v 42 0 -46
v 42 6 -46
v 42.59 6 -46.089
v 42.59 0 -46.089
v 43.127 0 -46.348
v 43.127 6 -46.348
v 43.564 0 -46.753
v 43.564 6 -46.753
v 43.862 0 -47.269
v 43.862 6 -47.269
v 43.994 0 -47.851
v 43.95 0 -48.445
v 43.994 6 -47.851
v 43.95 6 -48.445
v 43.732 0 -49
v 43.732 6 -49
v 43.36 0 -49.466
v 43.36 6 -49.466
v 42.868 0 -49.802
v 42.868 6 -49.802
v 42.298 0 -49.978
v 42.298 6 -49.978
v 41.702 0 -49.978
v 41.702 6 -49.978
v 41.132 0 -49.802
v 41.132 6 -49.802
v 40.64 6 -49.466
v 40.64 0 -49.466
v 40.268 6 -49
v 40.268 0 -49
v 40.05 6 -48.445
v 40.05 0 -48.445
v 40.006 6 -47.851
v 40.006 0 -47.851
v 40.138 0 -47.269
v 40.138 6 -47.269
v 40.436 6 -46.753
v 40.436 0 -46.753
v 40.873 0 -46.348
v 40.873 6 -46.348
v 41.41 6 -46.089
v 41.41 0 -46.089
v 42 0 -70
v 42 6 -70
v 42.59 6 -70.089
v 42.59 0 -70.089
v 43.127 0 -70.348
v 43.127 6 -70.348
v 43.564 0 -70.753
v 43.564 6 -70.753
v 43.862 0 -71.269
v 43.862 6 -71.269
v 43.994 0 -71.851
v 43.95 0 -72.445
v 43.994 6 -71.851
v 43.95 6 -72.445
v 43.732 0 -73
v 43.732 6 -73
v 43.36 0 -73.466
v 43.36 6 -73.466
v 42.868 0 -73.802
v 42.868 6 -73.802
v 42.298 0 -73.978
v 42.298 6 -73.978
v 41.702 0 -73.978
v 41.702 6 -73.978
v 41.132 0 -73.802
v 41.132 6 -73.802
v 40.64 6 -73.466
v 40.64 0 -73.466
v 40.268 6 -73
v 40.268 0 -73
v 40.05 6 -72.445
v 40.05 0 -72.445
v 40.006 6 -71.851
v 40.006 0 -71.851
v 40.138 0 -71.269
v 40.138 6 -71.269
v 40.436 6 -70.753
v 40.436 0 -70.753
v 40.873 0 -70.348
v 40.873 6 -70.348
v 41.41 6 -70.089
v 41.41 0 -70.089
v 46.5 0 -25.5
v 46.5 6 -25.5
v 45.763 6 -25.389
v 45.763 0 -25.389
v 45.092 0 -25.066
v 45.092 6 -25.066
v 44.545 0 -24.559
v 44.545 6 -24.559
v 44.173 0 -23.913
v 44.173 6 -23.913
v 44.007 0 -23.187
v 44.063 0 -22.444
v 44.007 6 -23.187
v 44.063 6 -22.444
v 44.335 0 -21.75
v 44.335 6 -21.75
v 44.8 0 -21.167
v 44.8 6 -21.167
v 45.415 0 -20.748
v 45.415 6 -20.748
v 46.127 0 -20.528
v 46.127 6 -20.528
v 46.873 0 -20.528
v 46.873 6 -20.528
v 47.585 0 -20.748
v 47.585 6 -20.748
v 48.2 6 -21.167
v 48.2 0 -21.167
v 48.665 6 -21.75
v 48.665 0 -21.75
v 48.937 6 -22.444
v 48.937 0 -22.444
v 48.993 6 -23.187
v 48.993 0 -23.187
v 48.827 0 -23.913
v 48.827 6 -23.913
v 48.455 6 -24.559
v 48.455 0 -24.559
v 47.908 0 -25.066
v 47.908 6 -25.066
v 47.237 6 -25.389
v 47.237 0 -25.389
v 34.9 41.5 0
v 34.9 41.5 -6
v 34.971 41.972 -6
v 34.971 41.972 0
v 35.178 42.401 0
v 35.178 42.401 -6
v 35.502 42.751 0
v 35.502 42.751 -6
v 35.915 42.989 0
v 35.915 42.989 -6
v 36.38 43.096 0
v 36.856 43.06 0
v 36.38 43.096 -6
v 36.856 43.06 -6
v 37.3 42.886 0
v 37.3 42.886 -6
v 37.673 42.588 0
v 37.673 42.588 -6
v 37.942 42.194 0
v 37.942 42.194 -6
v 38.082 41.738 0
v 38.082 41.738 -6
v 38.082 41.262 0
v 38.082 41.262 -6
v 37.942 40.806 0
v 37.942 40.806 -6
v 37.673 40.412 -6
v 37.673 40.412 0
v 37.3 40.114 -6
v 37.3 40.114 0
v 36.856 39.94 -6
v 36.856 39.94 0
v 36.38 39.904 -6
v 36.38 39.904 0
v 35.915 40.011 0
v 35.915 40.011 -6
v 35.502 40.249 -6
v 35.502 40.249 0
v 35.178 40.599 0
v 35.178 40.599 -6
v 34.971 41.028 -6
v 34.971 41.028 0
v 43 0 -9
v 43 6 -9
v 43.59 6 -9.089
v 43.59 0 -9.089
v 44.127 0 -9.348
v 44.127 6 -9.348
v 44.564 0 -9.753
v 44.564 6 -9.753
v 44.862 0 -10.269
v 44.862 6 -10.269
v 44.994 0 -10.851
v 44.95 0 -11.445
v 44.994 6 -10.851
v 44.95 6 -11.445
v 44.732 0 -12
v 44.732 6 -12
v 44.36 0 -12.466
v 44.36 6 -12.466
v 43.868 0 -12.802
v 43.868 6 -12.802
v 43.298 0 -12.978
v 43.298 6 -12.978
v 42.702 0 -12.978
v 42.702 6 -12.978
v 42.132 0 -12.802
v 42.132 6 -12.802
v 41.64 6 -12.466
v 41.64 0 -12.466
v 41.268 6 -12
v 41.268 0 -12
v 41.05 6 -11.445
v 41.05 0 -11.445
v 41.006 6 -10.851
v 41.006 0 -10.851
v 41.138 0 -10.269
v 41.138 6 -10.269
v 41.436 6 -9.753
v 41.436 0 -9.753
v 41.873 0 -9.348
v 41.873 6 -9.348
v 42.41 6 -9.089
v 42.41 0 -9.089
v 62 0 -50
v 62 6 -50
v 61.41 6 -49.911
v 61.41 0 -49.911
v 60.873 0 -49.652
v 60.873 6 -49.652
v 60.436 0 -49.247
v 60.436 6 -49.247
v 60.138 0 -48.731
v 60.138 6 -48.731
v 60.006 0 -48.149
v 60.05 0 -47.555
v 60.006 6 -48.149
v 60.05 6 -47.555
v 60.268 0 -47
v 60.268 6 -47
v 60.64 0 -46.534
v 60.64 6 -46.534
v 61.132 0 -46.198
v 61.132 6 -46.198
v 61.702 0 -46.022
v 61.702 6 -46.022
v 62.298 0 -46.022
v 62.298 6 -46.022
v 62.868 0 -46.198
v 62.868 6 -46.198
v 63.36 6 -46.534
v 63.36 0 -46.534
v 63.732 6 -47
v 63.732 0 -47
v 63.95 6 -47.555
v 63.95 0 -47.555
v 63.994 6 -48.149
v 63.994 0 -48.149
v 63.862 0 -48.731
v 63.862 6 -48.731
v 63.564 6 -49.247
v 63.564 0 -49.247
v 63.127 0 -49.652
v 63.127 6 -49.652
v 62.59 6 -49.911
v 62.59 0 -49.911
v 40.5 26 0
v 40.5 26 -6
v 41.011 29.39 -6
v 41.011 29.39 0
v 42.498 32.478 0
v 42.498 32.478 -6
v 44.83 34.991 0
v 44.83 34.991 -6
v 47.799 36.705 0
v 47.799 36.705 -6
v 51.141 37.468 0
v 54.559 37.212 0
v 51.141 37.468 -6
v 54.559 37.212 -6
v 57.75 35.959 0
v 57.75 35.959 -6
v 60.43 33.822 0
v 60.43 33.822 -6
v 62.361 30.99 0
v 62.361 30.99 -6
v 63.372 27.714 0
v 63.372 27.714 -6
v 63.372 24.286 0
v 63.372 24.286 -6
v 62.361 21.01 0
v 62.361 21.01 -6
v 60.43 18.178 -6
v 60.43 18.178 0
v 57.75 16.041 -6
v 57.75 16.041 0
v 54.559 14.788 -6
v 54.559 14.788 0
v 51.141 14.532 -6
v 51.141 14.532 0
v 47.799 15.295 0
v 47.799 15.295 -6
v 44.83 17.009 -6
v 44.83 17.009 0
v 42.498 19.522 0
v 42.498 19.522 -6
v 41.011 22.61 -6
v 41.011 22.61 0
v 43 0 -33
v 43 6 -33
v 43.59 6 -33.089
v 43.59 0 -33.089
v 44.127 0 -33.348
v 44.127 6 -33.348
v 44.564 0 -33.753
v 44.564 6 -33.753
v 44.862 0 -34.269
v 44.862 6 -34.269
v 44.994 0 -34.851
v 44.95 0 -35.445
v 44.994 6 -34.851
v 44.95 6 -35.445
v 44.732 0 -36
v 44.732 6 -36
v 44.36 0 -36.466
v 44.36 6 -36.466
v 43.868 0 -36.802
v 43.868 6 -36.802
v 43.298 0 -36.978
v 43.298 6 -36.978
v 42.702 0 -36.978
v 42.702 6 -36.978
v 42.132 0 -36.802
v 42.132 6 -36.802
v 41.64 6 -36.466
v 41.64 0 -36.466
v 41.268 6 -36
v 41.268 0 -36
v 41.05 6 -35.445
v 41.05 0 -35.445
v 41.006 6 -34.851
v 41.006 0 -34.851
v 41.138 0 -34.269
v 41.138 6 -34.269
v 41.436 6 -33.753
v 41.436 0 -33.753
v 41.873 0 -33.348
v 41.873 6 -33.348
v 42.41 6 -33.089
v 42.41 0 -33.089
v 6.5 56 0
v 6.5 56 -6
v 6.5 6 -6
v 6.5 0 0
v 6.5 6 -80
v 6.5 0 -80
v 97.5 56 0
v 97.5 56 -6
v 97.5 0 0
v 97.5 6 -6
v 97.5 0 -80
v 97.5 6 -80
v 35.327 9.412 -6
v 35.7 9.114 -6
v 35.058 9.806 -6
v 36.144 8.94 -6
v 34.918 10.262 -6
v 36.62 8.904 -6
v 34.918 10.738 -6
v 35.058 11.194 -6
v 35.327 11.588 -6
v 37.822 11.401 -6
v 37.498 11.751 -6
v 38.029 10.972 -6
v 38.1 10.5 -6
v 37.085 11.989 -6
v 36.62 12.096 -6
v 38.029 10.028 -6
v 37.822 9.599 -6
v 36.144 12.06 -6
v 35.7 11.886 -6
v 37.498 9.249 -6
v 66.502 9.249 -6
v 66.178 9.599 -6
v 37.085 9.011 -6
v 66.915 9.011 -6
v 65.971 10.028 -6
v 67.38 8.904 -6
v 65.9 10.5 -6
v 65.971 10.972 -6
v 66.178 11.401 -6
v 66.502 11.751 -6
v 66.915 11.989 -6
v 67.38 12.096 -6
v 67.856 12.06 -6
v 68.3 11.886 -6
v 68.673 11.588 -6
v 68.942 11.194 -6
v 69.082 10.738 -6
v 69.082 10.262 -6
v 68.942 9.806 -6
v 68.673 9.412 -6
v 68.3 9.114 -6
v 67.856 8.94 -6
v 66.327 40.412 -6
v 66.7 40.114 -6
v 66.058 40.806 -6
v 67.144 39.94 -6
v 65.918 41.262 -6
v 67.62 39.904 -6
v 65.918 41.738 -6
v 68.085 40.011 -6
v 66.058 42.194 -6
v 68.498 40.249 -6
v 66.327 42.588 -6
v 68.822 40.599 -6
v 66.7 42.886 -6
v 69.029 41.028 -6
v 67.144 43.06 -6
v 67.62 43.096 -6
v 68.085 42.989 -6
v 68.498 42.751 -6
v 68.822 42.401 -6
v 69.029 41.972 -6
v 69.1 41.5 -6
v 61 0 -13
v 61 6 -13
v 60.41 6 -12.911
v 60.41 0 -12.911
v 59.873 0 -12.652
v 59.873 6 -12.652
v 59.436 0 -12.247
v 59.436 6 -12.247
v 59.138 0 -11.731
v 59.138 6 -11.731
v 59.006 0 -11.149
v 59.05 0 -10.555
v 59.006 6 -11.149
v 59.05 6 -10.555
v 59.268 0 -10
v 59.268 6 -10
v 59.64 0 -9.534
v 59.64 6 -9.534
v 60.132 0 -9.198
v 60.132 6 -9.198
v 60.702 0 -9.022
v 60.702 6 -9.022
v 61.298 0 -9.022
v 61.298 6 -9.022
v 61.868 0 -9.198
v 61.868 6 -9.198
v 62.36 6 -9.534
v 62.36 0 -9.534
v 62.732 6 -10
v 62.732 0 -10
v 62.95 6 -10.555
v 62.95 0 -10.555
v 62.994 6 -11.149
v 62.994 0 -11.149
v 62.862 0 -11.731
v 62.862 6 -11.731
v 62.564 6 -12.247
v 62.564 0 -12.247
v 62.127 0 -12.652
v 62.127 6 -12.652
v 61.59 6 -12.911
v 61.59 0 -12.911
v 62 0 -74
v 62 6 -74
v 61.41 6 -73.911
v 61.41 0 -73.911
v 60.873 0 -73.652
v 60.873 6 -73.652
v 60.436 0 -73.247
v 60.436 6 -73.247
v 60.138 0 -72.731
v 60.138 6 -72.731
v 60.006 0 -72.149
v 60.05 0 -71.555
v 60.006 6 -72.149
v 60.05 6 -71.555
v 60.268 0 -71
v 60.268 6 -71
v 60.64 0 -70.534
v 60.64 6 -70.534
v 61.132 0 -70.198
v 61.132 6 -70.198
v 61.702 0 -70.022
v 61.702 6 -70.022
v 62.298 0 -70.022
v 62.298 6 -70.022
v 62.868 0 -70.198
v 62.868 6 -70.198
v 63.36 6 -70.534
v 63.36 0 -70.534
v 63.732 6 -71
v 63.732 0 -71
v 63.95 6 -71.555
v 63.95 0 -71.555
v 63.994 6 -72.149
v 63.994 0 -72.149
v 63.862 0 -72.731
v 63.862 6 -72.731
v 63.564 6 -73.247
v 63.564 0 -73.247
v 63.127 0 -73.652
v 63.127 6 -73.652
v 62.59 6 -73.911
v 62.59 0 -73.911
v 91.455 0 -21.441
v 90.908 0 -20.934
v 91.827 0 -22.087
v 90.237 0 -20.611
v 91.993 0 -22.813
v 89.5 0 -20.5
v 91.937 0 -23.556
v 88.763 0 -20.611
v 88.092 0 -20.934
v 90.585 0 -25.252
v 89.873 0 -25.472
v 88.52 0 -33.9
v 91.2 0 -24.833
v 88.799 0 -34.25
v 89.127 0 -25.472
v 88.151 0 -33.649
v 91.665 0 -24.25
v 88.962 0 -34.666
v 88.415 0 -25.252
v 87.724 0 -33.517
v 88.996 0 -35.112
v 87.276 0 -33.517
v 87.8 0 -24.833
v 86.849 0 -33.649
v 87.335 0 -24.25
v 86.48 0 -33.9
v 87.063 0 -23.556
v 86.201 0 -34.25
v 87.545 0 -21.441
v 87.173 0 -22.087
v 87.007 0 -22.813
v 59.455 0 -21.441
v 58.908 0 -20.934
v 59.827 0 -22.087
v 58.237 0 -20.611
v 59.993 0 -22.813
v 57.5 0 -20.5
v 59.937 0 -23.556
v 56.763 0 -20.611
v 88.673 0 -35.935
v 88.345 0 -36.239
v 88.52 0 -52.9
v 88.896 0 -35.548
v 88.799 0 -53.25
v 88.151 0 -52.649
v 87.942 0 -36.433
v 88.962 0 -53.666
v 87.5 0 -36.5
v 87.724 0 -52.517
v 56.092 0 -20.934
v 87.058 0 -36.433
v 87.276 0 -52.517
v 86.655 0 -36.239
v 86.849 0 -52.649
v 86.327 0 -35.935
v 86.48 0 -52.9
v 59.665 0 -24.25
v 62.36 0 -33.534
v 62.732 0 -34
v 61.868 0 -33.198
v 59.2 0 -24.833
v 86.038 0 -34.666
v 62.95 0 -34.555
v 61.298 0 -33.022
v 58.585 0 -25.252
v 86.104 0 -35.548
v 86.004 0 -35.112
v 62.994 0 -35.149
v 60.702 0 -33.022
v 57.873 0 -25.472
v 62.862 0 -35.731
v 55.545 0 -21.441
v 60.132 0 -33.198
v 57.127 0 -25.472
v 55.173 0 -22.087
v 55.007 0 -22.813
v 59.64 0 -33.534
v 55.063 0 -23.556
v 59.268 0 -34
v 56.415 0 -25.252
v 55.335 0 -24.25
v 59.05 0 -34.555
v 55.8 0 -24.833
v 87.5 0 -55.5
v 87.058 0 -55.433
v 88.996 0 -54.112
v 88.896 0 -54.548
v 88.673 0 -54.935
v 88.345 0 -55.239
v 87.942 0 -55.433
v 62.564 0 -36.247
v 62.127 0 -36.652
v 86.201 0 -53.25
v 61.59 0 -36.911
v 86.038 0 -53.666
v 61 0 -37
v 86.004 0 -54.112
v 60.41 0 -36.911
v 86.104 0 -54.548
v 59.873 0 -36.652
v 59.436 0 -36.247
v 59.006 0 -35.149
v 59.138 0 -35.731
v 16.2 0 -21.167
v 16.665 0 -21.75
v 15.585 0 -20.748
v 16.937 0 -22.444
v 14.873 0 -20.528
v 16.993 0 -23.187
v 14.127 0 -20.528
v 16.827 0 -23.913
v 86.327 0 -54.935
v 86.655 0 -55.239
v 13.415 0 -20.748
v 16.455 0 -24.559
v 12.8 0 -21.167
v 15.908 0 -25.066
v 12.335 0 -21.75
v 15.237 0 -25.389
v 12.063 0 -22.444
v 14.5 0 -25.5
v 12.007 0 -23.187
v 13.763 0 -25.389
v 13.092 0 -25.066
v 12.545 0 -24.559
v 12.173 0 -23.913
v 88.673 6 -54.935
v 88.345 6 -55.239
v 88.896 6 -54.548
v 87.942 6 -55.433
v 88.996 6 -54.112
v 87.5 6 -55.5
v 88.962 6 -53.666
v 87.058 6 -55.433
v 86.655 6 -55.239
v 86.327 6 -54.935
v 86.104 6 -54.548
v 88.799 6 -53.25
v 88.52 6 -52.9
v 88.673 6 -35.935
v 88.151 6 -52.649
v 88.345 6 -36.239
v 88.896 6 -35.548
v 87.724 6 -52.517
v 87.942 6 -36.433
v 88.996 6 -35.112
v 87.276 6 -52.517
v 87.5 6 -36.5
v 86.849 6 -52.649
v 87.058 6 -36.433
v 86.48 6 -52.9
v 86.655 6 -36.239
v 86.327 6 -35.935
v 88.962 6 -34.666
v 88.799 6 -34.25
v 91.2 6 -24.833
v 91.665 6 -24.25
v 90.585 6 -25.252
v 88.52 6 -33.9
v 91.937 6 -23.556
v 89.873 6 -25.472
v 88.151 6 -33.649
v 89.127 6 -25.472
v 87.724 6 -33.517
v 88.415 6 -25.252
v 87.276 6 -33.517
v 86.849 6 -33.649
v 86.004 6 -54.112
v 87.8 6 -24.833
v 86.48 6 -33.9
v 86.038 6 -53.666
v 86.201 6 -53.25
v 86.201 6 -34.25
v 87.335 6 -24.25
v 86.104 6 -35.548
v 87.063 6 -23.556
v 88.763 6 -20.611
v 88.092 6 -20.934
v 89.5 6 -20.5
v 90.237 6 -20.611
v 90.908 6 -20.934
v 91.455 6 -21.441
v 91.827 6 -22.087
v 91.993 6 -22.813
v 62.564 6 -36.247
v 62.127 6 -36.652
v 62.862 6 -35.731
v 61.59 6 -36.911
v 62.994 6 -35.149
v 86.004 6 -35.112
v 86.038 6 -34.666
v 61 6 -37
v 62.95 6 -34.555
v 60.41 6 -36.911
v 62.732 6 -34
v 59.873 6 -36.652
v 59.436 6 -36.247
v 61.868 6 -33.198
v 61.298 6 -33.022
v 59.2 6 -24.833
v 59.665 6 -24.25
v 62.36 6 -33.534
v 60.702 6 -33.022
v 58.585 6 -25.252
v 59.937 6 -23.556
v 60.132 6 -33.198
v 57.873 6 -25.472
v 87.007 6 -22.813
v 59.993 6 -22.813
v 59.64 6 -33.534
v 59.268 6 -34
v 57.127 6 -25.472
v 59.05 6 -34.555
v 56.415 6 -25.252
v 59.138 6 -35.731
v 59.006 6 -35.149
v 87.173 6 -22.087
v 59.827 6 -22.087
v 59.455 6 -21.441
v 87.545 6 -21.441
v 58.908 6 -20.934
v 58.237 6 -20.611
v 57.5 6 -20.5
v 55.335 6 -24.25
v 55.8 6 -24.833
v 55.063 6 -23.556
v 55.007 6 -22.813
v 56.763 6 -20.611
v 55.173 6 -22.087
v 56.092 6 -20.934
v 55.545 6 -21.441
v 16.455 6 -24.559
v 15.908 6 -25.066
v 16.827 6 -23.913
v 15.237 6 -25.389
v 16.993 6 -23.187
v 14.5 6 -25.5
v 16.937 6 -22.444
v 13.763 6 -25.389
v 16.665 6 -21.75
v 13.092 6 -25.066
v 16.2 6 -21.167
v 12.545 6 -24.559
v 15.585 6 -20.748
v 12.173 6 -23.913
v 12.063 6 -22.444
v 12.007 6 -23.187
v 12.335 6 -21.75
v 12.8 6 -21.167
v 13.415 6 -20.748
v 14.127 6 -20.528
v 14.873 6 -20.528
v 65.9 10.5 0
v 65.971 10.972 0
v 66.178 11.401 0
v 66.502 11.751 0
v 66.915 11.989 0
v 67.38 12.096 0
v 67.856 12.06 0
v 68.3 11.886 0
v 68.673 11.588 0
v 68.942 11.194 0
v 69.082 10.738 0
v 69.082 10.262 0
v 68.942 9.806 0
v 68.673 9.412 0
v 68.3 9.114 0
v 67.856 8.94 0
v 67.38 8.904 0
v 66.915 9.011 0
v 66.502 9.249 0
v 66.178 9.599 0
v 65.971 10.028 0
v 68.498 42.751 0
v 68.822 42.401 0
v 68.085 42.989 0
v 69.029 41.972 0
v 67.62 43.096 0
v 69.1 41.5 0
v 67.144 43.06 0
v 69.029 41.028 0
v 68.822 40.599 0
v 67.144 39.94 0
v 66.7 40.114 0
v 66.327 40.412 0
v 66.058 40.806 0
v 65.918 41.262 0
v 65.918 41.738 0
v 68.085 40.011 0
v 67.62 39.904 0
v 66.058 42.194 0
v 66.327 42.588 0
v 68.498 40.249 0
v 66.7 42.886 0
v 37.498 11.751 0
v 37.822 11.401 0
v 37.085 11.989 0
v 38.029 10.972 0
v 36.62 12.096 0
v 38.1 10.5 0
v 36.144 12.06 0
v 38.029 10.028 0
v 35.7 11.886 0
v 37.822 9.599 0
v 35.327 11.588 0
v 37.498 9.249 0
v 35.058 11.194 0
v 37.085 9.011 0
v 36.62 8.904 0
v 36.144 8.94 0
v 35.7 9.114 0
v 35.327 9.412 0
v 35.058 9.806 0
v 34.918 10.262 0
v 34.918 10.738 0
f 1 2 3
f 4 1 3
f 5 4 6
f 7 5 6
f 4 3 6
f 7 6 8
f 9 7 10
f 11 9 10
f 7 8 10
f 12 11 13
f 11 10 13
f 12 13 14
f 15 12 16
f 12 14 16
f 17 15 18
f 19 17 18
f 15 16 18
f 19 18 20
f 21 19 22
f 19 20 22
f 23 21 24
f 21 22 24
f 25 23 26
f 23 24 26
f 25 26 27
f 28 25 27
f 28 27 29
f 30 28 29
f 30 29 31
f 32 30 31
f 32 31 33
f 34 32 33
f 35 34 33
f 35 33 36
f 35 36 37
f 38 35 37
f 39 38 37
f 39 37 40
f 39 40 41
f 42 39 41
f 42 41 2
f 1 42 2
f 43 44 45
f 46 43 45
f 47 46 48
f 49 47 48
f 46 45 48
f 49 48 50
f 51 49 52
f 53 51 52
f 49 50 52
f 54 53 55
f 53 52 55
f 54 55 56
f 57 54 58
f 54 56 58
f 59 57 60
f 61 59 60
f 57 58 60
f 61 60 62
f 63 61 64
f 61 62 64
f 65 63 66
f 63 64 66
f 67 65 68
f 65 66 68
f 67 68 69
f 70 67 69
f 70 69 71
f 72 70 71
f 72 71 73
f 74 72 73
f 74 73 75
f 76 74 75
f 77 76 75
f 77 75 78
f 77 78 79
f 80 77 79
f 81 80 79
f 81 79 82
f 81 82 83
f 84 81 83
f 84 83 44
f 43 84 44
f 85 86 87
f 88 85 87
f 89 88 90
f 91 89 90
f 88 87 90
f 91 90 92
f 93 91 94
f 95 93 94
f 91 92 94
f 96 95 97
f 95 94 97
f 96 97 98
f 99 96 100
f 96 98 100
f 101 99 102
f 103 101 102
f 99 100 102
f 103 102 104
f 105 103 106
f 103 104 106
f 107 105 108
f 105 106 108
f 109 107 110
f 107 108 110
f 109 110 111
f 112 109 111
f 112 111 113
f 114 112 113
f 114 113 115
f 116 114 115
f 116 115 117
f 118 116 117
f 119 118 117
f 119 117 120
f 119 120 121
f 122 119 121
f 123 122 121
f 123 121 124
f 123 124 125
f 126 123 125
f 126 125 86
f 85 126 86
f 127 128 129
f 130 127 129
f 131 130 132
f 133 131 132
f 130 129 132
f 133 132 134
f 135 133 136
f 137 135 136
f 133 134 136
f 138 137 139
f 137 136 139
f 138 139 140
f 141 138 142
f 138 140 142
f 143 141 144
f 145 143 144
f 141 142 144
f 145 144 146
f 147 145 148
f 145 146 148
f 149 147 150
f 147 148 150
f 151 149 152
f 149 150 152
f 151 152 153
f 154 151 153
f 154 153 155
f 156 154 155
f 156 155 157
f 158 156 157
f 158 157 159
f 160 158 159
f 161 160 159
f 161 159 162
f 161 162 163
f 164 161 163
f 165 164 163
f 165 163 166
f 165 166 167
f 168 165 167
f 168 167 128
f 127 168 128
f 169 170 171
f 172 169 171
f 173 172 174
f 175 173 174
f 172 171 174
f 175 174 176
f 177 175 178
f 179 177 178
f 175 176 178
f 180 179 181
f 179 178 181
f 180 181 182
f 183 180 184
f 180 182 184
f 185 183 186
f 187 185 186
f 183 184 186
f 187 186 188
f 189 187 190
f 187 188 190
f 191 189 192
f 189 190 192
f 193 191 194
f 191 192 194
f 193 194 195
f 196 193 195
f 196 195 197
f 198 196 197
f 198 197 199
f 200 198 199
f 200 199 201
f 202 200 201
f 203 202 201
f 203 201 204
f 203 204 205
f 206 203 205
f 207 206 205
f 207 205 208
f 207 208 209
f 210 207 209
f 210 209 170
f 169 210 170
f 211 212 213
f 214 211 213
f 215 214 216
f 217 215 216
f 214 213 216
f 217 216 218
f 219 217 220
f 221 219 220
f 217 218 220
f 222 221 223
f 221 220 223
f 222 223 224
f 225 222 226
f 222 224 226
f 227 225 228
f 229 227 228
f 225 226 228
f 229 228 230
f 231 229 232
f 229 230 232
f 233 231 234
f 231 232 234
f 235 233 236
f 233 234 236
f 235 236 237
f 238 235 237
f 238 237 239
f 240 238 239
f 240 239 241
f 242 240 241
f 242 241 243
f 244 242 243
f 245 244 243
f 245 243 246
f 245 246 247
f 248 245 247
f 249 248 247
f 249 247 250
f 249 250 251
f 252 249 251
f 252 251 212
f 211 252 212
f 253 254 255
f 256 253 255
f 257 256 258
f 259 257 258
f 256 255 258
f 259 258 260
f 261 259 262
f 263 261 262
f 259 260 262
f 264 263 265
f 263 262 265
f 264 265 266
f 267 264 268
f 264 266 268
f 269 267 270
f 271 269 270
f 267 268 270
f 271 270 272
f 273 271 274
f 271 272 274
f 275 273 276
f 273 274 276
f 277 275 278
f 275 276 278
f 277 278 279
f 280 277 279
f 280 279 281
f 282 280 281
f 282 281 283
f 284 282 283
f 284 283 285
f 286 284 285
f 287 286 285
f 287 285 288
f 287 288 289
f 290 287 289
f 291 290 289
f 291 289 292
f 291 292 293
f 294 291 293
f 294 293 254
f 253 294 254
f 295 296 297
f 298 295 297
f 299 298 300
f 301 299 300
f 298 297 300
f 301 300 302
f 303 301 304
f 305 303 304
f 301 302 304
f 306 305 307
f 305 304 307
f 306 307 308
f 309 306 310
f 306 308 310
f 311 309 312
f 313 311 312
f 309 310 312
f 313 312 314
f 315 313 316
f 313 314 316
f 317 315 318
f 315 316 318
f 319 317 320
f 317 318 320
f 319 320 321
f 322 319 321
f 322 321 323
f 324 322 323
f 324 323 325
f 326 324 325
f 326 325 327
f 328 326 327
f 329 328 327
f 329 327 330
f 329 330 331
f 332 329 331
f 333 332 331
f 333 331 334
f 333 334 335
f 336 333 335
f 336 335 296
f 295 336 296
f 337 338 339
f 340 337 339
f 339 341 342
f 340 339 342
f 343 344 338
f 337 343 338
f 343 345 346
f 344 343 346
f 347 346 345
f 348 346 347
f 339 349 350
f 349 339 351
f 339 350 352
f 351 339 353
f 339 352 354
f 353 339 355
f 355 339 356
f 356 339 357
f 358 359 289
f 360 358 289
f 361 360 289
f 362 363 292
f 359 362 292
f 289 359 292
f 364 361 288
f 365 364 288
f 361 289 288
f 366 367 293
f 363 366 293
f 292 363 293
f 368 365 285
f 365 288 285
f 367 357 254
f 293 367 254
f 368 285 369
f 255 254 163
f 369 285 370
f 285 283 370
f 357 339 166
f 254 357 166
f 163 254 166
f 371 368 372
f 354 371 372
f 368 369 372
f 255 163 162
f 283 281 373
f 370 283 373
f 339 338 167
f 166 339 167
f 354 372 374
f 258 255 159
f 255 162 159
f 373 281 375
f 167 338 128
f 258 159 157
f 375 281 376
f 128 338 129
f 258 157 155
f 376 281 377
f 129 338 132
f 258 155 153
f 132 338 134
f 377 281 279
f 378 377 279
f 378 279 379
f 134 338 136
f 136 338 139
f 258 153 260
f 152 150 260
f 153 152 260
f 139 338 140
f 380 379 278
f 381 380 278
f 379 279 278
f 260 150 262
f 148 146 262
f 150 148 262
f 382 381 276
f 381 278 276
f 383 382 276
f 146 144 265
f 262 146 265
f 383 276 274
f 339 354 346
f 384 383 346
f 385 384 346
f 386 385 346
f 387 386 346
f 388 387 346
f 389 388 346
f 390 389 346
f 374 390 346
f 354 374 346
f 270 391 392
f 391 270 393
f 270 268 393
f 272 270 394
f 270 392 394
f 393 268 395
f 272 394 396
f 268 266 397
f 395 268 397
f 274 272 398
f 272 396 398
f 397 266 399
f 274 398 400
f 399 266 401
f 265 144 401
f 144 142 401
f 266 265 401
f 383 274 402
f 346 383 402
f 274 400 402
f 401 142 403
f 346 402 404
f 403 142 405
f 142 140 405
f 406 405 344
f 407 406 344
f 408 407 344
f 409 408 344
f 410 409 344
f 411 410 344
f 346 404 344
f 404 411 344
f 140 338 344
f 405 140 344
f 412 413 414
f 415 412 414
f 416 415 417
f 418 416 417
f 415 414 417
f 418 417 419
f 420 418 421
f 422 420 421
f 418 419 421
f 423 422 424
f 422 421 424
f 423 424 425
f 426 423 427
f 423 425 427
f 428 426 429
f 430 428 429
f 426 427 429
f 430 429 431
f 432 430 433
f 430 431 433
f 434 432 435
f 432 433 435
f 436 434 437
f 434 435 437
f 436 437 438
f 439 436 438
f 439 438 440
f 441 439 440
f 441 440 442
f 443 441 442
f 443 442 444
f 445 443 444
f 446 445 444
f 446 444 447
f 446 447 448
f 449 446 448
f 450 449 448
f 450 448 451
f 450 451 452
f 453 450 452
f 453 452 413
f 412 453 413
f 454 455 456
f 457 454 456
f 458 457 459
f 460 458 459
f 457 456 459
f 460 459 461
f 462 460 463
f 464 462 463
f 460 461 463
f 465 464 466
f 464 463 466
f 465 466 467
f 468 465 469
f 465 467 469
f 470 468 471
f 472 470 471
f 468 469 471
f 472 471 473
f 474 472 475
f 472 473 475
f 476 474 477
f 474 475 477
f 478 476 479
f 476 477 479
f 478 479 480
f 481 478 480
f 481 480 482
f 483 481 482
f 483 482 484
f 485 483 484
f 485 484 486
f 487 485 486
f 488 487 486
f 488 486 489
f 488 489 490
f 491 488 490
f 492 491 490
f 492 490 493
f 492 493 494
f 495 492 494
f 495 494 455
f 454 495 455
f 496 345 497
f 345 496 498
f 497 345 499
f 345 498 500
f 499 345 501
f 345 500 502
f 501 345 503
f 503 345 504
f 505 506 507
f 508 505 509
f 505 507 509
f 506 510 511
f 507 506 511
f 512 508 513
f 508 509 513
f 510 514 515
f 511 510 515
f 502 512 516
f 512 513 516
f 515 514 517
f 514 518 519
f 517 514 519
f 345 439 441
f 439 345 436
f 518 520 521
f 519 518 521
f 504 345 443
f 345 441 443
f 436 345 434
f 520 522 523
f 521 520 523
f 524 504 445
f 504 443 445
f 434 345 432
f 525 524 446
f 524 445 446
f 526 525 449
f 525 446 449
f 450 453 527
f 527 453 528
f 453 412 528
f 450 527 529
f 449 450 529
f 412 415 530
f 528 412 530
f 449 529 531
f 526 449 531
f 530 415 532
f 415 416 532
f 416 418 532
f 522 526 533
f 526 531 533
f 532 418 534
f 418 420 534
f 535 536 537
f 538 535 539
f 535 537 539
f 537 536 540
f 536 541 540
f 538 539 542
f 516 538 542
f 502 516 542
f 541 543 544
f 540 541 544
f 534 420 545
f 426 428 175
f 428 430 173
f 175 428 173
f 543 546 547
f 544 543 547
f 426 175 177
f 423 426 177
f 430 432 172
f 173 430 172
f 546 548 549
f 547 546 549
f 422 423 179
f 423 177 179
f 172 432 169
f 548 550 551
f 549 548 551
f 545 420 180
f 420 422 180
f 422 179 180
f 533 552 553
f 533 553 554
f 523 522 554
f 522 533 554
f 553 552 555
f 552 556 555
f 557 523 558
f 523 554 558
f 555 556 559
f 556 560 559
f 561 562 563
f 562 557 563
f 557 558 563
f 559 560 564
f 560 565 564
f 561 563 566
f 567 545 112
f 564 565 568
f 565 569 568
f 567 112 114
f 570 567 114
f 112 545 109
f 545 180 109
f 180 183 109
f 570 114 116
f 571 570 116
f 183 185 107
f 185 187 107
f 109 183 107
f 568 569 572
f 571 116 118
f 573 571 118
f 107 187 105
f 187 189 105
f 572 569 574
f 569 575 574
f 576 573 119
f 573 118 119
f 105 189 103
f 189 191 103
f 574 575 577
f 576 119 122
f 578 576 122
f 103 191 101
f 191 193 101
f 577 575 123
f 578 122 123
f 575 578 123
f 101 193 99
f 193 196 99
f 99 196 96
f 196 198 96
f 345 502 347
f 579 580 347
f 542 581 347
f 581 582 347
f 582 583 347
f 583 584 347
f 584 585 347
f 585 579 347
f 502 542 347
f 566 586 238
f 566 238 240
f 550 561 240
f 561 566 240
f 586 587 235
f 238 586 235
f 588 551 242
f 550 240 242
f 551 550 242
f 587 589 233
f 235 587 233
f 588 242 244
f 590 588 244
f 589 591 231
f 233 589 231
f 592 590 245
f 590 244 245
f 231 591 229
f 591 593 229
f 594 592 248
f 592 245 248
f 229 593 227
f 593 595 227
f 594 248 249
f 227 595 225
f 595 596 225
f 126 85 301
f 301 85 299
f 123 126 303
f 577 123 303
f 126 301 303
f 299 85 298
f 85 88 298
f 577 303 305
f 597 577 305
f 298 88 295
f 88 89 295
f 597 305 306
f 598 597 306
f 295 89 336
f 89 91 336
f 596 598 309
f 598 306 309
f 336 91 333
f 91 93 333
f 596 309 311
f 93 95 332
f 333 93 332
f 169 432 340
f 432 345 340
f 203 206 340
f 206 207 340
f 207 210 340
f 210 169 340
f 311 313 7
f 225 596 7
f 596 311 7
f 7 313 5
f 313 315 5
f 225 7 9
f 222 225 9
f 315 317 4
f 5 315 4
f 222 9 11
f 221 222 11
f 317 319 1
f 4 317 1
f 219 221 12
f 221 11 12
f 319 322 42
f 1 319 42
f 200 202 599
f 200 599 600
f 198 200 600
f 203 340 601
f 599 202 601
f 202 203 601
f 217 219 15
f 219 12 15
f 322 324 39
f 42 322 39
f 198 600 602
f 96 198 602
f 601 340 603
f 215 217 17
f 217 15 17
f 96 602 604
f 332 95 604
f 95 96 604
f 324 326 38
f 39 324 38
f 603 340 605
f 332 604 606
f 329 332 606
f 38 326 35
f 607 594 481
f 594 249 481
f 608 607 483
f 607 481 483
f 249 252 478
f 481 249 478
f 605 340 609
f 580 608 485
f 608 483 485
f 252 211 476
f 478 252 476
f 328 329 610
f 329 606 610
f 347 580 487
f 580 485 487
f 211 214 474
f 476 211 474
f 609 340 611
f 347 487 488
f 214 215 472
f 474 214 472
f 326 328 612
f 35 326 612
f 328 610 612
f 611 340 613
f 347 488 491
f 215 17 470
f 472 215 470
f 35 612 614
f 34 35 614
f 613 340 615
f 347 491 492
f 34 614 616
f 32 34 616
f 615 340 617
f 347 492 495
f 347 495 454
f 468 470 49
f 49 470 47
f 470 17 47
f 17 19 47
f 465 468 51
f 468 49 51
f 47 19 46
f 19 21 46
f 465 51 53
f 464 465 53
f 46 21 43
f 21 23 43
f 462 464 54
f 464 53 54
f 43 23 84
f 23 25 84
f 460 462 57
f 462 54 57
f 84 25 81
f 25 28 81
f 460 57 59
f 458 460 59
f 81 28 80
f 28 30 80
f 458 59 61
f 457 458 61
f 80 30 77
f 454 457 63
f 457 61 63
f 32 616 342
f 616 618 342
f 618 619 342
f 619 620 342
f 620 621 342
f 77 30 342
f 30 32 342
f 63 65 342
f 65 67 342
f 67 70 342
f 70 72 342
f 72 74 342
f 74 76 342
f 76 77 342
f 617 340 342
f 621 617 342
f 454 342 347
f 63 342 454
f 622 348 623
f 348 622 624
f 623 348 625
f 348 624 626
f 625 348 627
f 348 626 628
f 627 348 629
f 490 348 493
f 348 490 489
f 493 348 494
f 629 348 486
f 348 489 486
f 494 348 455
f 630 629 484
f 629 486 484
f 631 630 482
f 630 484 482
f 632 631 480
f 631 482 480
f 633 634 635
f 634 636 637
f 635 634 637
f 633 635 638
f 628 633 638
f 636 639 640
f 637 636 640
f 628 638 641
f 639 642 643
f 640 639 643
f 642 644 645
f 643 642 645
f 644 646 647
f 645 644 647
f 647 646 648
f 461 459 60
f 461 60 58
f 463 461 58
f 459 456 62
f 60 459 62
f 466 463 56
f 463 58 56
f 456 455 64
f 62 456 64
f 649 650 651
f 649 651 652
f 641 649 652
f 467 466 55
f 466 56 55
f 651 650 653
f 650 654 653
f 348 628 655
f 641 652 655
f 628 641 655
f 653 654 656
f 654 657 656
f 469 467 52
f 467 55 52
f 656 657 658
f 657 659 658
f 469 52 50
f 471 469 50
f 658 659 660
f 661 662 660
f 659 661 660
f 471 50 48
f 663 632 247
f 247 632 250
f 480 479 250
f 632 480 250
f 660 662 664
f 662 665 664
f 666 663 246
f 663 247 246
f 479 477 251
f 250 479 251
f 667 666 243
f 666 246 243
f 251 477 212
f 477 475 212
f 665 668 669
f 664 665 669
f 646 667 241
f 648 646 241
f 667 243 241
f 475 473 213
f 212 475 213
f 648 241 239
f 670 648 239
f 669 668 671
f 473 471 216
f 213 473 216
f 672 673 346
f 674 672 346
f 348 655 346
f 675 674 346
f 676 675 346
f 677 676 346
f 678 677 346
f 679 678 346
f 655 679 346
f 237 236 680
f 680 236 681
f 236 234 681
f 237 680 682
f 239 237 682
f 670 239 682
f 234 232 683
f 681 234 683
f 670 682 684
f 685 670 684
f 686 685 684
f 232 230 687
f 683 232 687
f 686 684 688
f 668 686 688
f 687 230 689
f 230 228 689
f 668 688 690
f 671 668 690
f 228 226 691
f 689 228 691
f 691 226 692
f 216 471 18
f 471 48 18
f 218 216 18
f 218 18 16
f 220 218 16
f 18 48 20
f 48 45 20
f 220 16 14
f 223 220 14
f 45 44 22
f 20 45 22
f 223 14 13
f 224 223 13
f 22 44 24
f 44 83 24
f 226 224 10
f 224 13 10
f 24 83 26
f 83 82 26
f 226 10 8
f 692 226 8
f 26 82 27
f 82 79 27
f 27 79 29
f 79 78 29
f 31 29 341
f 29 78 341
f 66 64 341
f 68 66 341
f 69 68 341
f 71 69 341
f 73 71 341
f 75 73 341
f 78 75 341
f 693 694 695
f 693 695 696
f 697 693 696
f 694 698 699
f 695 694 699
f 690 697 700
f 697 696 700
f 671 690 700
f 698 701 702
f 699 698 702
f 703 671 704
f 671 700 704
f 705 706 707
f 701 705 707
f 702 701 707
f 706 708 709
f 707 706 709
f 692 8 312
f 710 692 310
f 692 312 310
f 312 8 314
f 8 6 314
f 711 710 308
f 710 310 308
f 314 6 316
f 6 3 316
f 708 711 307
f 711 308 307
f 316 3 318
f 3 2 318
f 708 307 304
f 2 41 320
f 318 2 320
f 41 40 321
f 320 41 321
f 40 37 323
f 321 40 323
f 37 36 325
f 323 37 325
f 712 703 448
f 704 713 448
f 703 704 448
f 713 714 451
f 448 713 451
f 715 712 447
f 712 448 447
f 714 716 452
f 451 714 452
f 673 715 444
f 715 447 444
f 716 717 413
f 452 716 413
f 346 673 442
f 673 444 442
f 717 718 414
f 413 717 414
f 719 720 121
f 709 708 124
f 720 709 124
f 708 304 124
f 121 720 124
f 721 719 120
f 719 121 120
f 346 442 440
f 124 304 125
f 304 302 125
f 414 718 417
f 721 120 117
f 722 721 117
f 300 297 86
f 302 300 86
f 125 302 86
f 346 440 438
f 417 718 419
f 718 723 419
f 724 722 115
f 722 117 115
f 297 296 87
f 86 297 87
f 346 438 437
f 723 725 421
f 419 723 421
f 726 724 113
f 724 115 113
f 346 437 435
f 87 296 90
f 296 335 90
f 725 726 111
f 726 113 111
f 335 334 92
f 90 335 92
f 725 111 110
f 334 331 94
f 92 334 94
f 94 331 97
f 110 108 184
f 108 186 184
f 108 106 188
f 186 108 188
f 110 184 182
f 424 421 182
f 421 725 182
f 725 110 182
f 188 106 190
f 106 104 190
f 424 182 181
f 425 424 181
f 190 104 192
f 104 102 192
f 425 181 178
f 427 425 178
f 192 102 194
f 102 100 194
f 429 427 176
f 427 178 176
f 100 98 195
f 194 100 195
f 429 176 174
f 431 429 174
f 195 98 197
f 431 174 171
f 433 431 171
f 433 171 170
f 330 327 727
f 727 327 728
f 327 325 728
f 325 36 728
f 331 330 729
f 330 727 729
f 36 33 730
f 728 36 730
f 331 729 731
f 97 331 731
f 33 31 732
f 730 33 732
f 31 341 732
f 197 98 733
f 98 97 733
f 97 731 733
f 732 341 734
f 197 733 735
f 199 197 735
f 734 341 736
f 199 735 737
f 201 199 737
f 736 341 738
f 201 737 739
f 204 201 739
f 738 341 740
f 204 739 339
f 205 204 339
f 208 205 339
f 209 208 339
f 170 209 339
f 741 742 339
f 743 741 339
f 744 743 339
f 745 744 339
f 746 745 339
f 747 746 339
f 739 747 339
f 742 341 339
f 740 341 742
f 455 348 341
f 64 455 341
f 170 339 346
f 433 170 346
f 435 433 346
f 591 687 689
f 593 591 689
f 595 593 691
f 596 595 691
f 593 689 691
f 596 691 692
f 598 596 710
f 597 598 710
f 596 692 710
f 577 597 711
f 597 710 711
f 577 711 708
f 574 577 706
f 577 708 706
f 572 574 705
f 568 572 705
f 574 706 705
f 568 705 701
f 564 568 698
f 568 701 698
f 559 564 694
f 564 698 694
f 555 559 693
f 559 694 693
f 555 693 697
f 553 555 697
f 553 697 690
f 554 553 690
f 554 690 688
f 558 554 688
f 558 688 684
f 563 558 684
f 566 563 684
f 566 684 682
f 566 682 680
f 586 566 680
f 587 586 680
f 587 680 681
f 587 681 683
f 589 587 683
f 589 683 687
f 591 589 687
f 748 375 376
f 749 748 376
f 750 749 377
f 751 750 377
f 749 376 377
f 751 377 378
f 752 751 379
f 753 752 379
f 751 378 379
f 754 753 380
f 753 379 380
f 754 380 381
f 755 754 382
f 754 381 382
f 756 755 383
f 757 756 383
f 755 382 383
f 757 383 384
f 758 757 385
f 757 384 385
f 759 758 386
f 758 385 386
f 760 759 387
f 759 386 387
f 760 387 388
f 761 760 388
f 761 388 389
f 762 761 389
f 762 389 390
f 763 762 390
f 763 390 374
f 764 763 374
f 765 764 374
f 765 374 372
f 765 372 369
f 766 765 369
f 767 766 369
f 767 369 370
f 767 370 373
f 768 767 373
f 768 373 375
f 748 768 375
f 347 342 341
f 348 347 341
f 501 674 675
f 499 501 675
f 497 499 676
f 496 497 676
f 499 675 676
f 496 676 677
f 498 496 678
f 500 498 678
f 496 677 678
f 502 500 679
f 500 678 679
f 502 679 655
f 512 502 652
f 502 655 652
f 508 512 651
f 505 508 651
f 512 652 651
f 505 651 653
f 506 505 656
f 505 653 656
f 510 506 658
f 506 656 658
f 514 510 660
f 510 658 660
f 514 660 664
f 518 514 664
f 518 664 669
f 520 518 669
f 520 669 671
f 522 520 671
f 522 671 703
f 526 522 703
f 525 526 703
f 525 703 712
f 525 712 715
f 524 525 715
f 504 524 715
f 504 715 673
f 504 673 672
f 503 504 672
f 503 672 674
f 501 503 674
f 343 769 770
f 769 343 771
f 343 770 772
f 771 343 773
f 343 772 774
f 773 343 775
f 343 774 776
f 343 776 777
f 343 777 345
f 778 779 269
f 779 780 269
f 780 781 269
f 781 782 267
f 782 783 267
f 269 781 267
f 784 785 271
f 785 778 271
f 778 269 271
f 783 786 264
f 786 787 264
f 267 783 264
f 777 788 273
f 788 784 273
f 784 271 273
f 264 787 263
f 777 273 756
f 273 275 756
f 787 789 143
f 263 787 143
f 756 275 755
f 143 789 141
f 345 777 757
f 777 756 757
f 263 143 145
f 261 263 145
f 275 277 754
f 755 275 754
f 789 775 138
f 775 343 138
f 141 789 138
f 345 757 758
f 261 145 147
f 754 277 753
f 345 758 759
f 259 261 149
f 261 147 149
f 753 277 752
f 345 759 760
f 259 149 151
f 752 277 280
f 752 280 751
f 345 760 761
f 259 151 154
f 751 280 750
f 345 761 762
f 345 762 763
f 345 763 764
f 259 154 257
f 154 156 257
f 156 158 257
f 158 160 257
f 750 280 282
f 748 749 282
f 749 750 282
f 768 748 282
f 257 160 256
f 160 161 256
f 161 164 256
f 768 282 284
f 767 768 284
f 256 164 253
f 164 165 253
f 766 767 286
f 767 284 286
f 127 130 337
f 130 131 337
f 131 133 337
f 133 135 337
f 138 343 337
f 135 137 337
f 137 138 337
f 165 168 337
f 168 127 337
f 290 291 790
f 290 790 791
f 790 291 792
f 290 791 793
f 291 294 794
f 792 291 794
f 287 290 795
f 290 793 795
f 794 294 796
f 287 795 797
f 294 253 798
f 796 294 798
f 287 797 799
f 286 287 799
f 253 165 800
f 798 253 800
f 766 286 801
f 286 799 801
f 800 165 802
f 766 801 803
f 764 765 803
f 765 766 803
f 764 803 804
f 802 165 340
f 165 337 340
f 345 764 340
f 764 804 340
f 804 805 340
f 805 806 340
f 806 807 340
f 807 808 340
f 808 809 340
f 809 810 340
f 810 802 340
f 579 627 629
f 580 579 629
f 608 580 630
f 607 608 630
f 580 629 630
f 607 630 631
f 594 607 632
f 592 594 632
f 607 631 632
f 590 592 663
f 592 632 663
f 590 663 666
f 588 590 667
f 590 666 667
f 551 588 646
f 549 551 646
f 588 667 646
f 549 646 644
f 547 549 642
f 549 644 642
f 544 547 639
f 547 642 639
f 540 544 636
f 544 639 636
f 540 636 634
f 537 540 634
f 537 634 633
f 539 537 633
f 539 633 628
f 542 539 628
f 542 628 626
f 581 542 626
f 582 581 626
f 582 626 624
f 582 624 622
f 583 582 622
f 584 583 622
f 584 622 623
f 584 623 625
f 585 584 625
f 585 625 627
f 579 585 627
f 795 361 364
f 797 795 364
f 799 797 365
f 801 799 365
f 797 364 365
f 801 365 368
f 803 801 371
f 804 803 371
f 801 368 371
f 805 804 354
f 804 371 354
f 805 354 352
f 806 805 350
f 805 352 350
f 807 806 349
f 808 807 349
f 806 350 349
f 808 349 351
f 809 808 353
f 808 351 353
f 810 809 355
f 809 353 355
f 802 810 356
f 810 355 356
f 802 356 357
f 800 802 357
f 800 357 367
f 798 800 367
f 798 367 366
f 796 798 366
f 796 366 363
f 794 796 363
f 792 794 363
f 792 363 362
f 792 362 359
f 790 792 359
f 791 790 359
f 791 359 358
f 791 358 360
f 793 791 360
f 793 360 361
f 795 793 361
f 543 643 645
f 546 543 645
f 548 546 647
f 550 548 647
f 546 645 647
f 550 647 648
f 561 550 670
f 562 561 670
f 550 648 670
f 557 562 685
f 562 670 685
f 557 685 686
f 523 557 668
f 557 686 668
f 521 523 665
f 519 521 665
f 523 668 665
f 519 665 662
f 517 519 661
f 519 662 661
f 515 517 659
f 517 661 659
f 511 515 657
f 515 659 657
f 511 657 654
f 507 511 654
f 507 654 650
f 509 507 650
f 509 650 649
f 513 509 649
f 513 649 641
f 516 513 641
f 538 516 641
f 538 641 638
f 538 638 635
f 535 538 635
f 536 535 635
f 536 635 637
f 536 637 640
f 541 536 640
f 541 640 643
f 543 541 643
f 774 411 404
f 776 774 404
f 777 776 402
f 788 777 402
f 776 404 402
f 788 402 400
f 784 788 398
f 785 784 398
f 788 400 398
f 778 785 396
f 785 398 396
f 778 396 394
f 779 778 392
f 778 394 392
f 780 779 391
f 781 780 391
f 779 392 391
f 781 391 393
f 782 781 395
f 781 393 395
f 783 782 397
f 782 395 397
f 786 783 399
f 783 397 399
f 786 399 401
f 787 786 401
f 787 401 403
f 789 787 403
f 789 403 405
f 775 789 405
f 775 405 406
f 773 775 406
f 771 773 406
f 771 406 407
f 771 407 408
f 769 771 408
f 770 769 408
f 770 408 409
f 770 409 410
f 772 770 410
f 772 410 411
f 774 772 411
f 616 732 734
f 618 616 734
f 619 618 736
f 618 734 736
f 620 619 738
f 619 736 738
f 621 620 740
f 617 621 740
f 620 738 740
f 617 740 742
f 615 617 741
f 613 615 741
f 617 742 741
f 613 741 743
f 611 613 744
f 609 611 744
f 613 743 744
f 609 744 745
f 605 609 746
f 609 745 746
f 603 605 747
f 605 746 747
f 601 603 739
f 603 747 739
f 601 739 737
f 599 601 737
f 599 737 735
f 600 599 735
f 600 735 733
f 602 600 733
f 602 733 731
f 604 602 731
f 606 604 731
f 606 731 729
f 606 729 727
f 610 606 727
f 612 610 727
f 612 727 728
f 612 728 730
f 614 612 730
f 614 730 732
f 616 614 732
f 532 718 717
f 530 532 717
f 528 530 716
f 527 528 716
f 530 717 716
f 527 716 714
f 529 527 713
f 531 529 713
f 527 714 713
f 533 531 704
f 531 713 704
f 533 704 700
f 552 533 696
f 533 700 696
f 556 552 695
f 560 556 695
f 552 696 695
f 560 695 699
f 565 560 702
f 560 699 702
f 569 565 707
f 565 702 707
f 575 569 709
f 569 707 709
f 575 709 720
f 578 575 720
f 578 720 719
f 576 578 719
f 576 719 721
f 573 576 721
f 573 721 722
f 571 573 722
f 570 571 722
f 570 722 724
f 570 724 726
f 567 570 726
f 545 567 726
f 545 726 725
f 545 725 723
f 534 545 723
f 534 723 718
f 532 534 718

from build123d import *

# Parameters (mm, degrees)
EXTRUDE_1_DEPTH     = 104
SKETCH_2_R          = 2
SKETCH_2_R_2        = 2.5
SKETCH_2_R_3        = 1.5
SKETCH_2_W          = 6.5
SKETCH_2_H          = 74
CUT_EXTRUDE_1_DEPTH = 151.638640461
SKETCH_3_R          = 11.5
SKETCH_3_R_2        = 1.6
CUT_EXTRUDE_2_DEPTH = 151.638640461


with BuildPart() as part:
    # 草图1 → 凸台-拉伸1 (new body)
    with BuildSketch(Plane(origin=(0, 0, 0), x_dir=(0, 0, -1), z_dir=(1, 0, 0))):
        Polygon((0, 0), (80, 0), (80, 6), (6, 6), (6, 80), (0, 80), (0, 6), align=None)
    extrude(amount=EXTRUDE_1_DEPTH)

    # 草图2 → 切除-拉伸1 (cut, through all)
    with BuildSketch(Plane(origin=(0, 6, 0), x_dir=(1, 0, 0), z_dir=(0, 1, 0))):
        with Locations(Location((43, 11, 0), (0, 0, 270))):
            Circle(SKETCH_2_R)
        with Locations(Location((43, 35, 0), (0, 0, 270))):
            Circle(SKETCH_2_R)
        with Locations(Location((42, 48, 0), (0, 0, 270))):
            Circle(SKETCH_2_R)
        with Locations(Location((42, 72, 0), (0, 0, 270))):
            Circle(SKETCH_2_R)
        with Locations(Location((62, 72, 0), (0, 0, 90))):
            Circle(SKETCH_2_R)
        with Locations(Location((62, 48, 0), (0, 0, 90))):
            Circle(SKETCH_2_R)
        with Locations(Location((61, 35, 0), (0, 0, 90))):
            Circle(SKETCH_2_R)
        with Locations(Location((61, 11, 0), (0, 0, 90))):
            Circle(SKETCH_2_R)
        with Locations(Location((57.5, 23, 0), (0, 0, 270))):
            Circle(SKETCH_2_R_2)
        with Locations(Location((89.5, 23, 0), (0, 0, 270))):
            Circle(SKETCH_2_R_2)
        with Locations(Location((46.5, 23, 0), (0, 0, 90))):
            Circle(SKETCH_2_R_2)
        with Locations(Location((14.5, 23, 0), (0, 0, 90))):
            Circle(SKETCH_2_R_2)
        with Locations(Location((87.5, 35, 0), (0, 0, 90))):
            Circle(SKETCH_2_R_3)
        with Locations(Location((87.5, 54, 0), (0, 0, 90))):
            Circle(SKETCH_2_R_3)
        with Locations((100.75, 43)):
            Rectangle(SKETCH_2_W, SKETCH_2_H)
        with Locations((3.25, 43)):
            Rectangle(SKETCH_2_W, SKETCH_2_H)
    extrude(amount=-CUT_EXTRUDE_1_DEPTH, mode=Mode.SUBTRACT)

    # 草图3 → 切除-拉伸2 (cut, through all)
    with BuildSketch(Plane(origin=(0, 0, -6), x_dir=(-1, 0, 0), z_dir=(0, 0, -1))):
        with Locations((-52, 26)):
            Circle(SKETCH_3_R)
        with Locations((-36.5, 41.5)):
            Circle(SKETCH_3_R_2)
        with Locations(Location((-67.5, 41.5, 0), (0, 0, 180))):
            Circle(SKETCH_3_R_2)
        with Locations((-67.5, 10.5)):
            Circle(SKETCH_3_R_2)
        with Locations(Location((-36.5, 10.5, 0), (0, 0, 180))):
            Circle(SKETCH_3_R_2)
        Polygon((-97.5, 0), (-97.5, 56), (-6.5, 56), (-6.5, 0), (0, 0), (0, 80), (-104, 80), (-104, 0), align=None)
    extrude(amount=-CUT_EXTRUDE_2_DEPTH, mode=Mode.SUBTRACT)


solid = part.part
